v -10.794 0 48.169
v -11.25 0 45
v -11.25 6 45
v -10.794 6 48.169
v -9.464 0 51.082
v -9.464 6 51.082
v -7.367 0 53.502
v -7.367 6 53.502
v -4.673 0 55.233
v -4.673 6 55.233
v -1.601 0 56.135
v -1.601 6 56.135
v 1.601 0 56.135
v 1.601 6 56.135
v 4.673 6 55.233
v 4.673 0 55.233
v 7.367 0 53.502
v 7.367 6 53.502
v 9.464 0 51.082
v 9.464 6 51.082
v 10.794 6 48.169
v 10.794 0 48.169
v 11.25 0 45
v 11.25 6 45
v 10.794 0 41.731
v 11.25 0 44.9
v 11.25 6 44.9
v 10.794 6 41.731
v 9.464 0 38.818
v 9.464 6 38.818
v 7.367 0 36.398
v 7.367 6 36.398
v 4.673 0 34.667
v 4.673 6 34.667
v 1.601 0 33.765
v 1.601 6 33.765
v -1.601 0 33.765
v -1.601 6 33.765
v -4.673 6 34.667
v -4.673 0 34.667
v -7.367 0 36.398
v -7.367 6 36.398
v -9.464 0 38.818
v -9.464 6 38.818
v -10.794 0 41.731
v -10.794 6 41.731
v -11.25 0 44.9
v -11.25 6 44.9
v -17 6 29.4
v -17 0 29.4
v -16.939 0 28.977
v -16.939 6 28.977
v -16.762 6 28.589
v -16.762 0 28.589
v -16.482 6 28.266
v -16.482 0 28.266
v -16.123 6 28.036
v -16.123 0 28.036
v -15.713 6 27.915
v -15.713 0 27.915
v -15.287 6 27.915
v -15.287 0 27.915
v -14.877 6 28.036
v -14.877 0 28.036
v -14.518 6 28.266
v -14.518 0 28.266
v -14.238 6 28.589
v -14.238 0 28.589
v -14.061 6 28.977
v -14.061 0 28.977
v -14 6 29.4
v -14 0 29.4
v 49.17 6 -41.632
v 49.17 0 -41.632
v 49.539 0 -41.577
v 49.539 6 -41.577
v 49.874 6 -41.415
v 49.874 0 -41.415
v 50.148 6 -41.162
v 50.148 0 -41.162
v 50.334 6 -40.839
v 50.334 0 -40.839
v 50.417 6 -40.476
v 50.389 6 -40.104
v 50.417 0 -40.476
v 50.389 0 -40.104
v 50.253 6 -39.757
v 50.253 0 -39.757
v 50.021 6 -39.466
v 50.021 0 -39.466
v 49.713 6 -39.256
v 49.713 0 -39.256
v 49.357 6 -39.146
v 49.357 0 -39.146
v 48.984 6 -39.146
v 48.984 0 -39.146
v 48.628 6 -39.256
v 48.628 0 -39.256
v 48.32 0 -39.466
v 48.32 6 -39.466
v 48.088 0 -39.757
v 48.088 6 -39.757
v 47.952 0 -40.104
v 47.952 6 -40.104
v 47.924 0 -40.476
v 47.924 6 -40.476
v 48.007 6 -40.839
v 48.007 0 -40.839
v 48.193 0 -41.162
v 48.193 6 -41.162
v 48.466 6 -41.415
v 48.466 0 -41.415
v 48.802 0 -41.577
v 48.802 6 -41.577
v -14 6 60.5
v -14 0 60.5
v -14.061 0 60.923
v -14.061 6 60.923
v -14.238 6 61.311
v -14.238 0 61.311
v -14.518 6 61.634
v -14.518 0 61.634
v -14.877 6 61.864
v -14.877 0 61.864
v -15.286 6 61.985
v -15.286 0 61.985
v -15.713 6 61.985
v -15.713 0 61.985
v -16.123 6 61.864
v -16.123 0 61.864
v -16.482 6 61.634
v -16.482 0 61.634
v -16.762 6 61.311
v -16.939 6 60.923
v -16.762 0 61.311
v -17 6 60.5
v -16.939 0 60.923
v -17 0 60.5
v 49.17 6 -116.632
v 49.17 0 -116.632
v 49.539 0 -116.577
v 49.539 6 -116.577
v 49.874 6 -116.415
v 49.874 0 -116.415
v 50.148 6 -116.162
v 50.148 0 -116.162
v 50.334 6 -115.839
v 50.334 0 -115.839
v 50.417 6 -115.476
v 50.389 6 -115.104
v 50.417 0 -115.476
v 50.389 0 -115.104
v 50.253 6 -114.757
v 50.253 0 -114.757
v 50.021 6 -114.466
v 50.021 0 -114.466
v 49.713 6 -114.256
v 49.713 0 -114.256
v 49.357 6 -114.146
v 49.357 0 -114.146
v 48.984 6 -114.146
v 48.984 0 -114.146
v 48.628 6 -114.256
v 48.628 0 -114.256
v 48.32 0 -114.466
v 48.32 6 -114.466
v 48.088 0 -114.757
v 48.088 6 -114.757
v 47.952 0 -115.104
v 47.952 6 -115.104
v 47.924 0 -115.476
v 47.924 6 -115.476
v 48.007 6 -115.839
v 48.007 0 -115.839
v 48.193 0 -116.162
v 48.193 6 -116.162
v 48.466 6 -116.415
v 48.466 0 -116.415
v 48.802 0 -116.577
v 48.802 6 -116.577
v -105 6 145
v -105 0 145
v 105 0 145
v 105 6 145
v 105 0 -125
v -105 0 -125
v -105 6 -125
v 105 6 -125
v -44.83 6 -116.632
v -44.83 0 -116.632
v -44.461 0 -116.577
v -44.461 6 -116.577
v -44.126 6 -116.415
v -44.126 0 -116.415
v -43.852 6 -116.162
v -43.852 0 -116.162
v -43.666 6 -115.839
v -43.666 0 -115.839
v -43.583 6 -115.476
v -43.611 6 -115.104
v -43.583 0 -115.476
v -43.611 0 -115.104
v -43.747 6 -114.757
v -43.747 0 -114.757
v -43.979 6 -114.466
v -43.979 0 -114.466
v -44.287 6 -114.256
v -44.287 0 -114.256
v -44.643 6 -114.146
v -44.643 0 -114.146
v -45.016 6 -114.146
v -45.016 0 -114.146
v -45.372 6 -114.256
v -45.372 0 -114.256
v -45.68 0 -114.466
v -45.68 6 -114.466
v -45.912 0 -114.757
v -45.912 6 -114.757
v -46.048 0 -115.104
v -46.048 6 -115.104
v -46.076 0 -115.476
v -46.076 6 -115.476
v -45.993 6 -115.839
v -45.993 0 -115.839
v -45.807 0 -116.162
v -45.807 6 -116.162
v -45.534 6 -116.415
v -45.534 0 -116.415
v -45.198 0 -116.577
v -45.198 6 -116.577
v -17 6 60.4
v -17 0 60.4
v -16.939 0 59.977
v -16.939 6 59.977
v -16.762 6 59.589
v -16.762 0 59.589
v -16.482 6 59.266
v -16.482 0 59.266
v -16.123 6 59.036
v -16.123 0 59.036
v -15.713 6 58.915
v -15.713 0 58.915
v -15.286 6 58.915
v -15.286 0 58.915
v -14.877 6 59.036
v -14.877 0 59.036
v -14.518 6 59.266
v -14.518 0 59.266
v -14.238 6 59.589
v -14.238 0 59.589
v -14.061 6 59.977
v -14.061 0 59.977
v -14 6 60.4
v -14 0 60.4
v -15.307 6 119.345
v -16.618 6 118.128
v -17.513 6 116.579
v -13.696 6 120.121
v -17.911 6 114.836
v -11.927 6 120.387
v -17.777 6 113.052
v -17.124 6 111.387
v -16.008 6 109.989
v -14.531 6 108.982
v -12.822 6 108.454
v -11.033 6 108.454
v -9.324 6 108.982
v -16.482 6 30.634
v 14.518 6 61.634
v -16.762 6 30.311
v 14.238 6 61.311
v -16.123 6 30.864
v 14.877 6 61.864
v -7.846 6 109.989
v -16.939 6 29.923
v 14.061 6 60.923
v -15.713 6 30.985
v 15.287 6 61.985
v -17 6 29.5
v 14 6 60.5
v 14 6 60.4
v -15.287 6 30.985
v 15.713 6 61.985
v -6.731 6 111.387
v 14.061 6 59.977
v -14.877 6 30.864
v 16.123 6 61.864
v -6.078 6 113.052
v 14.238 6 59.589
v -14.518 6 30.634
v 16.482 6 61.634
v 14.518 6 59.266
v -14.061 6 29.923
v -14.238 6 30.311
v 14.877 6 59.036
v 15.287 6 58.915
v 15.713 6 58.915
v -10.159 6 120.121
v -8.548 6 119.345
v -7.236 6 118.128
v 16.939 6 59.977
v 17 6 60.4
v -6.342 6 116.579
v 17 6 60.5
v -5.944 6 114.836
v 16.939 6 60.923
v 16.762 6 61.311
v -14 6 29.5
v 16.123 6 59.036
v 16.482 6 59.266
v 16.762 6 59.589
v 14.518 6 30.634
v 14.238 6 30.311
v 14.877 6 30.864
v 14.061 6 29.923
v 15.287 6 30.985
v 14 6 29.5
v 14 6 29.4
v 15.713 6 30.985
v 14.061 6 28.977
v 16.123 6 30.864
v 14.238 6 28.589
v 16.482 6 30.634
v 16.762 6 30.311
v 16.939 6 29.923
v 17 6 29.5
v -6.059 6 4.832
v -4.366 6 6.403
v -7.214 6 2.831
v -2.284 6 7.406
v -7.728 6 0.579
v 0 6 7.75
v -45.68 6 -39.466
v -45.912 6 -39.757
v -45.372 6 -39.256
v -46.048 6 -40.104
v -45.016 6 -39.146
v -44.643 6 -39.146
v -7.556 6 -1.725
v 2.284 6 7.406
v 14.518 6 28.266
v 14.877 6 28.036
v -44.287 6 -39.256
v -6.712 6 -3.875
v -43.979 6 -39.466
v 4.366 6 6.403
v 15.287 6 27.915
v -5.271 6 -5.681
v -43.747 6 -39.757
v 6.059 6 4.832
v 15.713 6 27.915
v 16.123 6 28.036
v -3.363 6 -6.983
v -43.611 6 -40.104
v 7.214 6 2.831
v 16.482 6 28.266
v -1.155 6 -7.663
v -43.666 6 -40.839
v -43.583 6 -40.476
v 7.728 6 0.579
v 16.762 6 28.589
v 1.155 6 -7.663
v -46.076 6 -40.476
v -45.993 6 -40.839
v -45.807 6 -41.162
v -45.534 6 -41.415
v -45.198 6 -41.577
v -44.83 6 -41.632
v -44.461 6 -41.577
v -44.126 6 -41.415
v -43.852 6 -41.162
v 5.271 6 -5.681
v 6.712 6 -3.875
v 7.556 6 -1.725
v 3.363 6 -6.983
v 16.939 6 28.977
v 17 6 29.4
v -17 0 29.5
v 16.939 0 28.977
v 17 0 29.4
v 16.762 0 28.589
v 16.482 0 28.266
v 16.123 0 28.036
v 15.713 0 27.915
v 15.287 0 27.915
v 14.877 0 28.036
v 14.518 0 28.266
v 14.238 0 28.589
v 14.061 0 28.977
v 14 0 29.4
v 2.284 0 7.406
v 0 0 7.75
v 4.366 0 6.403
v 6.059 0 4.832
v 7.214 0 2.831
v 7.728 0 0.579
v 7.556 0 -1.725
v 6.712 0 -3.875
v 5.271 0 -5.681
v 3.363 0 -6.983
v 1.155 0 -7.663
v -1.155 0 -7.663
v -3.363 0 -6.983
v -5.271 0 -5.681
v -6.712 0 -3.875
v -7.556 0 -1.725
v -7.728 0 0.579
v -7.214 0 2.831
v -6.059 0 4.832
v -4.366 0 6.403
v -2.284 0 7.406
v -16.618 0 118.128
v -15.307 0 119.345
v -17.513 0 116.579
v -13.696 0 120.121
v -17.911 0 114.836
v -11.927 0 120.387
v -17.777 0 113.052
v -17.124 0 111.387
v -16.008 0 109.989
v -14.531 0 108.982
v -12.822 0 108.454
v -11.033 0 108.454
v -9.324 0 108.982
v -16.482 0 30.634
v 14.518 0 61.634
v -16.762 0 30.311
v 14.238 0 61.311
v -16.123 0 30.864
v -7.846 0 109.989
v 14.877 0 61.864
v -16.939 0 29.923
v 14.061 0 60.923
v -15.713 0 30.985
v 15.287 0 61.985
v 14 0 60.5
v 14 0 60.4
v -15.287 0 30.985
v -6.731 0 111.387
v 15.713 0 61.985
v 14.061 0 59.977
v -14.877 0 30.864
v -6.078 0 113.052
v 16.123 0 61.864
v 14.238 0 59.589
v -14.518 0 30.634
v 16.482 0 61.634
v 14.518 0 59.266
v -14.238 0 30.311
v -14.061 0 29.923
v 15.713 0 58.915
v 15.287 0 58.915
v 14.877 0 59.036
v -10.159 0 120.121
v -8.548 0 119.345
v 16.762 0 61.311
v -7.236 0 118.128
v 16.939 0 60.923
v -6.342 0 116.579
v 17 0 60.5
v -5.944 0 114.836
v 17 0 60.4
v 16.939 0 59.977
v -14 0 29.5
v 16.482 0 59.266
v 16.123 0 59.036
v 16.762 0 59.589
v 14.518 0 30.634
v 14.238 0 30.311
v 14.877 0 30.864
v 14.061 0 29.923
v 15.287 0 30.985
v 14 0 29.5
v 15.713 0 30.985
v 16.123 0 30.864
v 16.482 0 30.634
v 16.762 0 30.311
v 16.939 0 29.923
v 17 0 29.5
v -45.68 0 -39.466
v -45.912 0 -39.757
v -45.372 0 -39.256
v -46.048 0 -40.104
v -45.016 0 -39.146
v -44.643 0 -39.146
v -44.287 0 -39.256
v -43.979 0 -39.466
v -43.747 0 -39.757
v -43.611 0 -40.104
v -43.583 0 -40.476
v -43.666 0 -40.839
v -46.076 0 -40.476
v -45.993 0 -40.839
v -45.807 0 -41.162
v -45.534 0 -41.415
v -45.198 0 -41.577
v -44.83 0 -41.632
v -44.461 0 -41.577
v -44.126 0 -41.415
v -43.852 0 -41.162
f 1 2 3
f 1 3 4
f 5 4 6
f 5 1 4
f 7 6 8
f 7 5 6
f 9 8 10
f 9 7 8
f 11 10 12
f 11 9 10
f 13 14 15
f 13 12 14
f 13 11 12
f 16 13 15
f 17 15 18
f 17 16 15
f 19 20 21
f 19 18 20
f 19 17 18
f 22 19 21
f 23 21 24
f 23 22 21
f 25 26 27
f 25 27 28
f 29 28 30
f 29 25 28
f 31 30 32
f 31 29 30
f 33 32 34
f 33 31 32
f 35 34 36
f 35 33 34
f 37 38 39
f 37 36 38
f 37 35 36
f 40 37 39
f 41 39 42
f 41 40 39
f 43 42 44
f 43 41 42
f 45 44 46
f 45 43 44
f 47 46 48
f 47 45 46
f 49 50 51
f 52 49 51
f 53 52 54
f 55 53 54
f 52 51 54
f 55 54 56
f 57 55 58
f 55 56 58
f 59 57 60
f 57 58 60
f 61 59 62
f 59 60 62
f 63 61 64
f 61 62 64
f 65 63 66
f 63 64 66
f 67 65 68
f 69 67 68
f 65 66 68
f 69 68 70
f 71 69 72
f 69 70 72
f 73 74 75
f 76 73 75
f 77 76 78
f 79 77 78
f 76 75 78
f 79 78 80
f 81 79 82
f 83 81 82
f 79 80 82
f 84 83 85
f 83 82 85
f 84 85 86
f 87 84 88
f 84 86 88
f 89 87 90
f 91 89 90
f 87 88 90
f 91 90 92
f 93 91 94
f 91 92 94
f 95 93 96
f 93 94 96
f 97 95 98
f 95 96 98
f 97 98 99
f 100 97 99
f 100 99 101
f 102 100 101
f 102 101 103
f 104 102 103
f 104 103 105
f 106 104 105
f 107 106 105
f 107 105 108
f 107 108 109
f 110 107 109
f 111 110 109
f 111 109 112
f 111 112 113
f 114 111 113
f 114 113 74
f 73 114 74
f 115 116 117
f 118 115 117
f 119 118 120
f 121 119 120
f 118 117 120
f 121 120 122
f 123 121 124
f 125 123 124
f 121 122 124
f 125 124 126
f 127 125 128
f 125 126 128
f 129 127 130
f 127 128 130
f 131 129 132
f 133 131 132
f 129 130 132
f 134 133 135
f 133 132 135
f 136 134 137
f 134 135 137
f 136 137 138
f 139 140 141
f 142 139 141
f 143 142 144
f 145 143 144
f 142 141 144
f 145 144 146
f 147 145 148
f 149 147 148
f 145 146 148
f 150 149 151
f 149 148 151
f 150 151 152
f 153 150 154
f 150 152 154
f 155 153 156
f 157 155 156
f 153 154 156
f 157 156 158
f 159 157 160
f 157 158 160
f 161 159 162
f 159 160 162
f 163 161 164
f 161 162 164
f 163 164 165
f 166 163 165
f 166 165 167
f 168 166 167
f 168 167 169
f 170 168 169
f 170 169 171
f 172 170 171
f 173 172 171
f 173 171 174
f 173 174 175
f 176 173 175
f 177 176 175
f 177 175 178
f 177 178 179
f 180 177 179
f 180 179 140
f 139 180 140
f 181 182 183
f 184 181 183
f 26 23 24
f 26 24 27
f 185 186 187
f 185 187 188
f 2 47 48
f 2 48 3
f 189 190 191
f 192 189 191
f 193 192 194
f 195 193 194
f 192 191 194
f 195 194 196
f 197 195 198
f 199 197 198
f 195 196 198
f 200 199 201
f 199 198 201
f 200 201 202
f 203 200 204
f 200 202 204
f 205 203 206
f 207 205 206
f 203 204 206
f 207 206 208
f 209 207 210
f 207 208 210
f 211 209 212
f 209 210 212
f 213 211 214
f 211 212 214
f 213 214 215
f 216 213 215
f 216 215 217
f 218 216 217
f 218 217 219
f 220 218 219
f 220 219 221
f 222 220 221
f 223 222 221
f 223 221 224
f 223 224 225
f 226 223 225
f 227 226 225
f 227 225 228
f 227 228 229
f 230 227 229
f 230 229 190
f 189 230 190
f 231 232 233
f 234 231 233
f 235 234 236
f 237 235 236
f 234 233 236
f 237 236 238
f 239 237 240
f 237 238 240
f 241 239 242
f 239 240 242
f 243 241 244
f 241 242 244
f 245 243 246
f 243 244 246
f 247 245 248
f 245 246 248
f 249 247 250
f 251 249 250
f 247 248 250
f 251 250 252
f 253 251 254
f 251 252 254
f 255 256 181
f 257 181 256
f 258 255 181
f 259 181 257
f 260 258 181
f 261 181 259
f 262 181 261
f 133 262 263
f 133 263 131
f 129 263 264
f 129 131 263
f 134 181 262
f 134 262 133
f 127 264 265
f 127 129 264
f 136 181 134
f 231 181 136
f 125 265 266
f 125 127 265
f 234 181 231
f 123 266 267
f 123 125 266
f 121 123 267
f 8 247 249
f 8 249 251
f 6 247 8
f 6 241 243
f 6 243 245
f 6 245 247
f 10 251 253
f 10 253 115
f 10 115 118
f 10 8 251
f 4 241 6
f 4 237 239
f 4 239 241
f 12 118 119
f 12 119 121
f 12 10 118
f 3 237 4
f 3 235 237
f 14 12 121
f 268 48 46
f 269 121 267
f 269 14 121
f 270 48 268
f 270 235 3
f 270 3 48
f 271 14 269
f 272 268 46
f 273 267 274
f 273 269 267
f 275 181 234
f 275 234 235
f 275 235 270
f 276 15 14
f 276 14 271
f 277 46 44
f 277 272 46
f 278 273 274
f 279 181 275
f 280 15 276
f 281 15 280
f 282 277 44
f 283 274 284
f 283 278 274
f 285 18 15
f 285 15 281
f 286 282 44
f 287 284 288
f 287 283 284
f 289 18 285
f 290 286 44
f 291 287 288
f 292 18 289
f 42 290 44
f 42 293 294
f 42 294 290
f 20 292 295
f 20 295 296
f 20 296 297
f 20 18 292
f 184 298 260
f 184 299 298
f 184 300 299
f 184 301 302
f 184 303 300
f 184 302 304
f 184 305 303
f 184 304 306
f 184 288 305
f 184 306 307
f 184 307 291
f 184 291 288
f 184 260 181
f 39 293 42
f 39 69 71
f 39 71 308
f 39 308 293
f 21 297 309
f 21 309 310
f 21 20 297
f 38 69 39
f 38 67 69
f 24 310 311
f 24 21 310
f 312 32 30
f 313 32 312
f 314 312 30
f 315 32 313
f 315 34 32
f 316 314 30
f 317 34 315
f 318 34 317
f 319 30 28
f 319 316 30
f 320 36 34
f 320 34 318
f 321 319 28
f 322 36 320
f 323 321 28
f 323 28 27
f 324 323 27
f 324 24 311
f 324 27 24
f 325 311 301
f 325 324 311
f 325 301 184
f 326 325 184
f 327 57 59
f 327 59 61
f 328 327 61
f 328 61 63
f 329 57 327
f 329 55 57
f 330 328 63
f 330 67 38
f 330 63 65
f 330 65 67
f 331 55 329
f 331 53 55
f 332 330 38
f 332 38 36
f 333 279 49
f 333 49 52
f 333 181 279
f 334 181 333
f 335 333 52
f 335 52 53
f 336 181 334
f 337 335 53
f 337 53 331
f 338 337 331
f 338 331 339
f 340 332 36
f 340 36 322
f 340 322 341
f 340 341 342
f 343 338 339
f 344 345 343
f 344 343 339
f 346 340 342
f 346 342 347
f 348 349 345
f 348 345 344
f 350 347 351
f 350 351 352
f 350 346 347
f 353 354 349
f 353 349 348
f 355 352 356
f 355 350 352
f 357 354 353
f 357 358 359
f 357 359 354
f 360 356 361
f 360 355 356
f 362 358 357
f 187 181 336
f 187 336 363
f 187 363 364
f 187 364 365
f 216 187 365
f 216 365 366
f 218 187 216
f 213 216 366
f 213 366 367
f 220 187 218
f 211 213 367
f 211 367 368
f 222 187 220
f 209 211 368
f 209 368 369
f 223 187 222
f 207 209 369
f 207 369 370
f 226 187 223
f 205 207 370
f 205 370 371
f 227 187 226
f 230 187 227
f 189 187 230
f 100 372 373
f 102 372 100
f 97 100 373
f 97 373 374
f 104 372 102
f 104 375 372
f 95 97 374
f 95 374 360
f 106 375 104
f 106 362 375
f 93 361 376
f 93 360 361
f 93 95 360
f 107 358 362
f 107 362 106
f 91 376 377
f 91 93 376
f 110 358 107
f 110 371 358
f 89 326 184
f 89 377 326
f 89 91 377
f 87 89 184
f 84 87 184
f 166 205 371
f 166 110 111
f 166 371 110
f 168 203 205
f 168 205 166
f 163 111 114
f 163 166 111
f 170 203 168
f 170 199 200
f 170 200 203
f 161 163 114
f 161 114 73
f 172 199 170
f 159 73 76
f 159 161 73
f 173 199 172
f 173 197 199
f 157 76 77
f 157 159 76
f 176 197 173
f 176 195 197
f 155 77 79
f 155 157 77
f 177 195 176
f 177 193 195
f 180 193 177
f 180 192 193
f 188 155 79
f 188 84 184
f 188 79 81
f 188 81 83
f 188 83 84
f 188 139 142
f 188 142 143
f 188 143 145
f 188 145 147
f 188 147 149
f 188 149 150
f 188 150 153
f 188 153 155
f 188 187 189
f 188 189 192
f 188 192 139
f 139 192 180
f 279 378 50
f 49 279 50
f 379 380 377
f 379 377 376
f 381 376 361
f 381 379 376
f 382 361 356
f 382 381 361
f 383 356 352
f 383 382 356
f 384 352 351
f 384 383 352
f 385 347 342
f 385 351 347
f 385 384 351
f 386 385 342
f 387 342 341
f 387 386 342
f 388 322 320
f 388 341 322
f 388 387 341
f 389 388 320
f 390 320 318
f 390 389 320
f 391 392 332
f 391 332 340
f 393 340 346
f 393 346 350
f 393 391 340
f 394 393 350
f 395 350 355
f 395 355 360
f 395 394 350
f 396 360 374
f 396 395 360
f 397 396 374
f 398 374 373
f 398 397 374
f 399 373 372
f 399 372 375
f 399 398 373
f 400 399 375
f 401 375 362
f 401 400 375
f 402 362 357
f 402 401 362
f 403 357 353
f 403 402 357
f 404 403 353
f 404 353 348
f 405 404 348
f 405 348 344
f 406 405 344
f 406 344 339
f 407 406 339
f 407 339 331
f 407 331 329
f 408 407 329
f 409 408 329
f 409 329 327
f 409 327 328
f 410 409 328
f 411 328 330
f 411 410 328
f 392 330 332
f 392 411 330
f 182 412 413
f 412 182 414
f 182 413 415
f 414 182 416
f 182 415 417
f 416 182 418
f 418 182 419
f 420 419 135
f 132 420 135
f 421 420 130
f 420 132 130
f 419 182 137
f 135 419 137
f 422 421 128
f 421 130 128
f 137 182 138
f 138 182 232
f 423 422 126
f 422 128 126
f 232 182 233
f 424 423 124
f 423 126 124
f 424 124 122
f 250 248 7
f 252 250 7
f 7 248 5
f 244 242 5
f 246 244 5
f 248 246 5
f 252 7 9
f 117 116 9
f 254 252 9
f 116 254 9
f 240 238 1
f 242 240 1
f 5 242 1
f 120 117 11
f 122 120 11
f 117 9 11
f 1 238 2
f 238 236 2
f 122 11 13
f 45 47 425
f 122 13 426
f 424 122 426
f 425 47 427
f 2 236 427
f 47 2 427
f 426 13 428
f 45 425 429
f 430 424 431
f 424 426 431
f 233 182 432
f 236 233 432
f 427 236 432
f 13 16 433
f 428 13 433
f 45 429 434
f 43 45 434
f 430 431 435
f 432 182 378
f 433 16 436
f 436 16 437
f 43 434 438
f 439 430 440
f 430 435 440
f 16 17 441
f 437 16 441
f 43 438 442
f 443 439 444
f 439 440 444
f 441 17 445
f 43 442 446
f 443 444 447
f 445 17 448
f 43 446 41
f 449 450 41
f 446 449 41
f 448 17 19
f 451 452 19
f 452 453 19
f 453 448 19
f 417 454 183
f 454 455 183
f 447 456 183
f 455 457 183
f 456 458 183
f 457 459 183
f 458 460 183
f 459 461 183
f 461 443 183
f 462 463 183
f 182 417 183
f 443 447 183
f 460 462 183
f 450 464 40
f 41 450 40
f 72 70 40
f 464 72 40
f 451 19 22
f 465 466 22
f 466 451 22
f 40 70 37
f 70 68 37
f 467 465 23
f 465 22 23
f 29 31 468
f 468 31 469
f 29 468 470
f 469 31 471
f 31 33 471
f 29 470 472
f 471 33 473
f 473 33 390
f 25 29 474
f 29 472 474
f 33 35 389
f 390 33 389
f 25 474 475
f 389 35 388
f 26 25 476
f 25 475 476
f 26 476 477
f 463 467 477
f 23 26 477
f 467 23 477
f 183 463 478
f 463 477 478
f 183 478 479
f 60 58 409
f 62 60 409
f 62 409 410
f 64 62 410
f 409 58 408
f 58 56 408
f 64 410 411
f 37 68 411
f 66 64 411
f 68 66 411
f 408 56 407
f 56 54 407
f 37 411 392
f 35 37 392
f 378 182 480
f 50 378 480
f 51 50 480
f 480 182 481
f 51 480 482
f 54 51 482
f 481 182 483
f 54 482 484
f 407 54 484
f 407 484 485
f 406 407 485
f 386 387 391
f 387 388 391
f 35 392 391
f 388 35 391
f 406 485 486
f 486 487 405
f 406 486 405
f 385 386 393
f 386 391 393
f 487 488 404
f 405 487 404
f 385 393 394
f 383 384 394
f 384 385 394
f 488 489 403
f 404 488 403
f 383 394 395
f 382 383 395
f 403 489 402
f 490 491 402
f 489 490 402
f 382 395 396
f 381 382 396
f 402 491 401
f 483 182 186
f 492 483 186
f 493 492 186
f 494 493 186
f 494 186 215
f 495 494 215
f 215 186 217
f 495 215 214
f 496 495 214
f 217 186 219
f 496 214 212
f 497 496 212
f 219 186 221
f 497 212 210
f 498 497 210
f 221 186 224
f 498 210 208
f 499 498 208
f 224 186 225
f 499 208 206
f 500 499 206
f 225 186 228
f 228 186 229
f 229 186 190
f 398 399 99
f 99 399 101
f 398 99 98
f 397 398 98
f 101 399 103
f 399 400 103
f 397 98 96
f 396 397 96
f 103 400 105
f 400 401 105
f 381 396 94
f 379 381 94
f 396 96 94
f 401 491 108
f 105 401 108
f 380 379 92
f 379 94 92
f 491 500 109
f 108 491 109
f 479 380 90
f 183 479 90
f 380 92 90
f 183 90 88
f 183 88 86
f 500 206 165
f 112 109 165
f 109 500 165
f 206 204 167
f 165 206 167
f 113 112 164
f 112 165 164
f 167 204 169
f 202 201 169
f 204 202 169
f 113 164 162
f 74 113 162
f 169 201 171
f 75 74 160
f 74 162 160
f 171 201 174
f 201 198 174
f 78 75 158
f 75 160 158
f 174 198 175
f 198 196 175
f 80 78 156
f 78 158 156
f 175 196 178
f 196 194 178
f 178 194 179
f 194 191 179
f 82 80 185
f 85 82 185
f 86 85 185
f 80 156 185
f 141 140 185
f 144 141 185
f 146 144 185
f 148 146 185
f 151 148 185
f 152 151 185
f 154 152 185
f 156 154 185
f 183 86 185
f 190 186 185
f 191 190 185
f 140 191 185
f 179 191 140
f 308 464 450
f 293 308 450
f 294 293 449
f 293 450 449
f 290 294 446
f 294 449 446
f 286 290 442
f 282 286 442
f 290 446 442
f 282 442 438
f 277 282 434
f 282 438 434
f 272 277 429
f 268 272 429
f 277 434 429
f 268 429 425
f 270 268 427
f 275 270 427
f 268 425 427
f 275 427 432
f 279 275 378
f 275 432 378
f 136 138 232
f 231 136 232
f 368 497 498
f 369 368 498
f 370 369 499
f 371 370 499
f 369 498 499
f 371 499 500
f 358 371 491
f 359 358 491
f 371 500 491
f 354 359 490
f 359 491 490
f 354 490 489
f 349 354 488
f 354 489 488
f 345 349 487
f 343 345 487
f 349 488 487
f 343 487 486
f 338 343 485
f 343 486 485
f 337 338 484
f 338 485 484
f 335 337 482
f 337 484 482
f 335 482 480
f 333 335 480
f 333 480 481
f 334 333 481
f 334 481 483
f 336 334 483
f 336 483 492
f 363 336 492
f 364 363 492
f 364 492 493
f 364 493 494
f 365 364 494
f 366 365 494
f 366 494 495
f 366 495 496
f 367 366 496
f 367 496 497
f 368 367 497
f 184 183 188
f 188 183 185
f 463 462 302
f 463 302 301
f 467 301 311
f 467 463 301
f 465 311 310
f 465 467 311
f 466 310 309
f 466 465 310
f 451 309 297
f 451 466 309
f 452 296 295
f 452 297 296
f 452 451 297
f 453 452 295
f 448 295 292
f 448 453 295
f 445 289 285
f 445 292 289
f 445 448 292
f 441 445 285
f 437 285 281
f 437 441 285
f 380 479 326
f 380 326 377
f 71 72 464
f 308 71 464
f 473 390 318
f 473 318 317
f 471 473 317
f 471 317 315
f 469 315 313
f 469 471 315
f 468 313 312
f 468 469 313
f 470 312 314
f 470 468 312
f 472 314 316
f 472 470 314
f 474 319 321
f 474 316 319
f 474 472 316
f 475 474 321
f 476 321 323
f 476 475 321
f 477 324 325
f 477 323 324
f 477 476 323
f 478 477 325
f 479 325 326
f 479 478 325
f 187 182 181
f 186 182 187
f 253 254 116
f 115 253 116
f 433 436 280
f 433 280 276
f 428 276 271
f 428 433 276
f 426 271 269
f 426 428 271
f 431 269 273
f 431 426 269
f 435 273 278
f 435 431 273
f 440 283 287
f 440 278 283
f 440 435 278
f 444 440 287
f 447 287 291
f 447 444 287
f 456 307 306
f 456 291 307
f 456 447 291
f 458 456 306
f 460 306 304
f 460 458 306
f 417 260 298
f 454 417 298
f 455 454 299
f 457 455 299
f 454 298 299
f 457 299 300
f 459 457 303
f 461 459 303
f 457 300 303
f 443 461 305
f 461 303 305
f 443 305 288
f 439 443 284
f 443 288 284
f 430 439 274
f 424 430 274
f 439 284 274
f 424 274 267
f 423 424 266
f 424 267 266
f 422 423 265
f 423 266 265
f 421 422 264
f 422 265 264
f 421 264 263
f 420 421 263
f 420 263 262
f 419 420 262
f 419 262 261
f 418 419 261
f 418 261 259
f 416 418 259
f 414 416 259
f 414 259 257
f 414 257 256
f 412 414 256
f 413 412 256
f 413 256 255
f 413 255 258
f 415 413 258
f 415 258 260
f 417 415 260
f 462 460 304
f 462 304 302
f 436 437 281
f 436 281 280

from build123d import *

# Parameters (mm, degrees)
SKETCH1_W           = 210
SKETCH1_H           = 270
SKETCH1_R           = 7.75
BOSS_EXTRUDE2_DEPTH = 6
CUT_EXTRUDE1_DEPTH  = 10
SKETCH4_R           = 1.25
CUT_EXTRUDE2_DEPTH  = 10
SKETCH5_R           = 6
CUT_EXTRUDE3_DEPTH  = 10


with BuildPart() as part:
    # Sketch1 → Boss-Extrude2 (new body)
    with BuildSketch(Plane(origin=(0, 0, 0), x_dir=(1, 0, 0), z_dir=(0, 1, 0))):
        with Locations((0, -10)):
            Rectangle(SKETCH1_W, SKETCH1_H)
        with Locations(Location((0, 0, 0), (0, 0, 270))):
            Circle(SKETCH1_R, mode=Mode.SUBTRACT)
    extrude(amount=BOSS_EXTRUDE2_DEPTH)

    # Sketch3 → Cut-Extrude1 (cut)
    with BuildSketch(Plane.XZ):
        with BuildLine():
            Line((17.000022153, 29.5), (17.000022153, 29.4))
            ThreePointArc((17.000022153, 29.4), (15.500022153, 27.9), (14.000022153, 29.4))
            Line((14.000022153, 29.4), (14.000022153, 29.5))
            ThreePointArc((14.000022153, 29.5), (15.500022153, 31), (17.000022153, 29.5))
        make_face()
        with BuildLine():
            Line((17.000022153, 60.5), (17.000022153, 60.4))
            ThreePointArc((17.000022153, 60.4), (15.500022153, 58.9), (14.000022153, 60.4))
            Line((14.000022153, 60.4), (14.000022153, 60.5))
            ThreePointArc((14.000022153, 60.5), (15.500022153, 62), (17.000022153, 60.5))
        make_face()
        with BuildLine():
            Line((-16.999993108, 29.500016738), (-16.999993206, 29.400016738))
            ThreePointArc((-16.999993206, 29.400016738), (-15.499994683, 27.900015261), (-13.999993206, 29.400013784))
            Line((-13.999993206, 29.400013784), (-13.999993108, 29.500013784))
            ThreePointArc((-13.999993108, 29.500013784), (-15.499991631, 31.000015261), (-16.999993108, 29.500016738))
        make_face()
        with BuildLine():
            Line((-16.999962586, 60.500016738), (-16.999962684, 60.400016738))
            ThreePointArc((-16.999962684, 60.400016738), (-15.499964161, 58.900015261), (-13.999962684, 60.400013784))
            Line((-13.999962684, 60.400013784), (-13.999962586, 60.500013784))
            ThreePointArc((-13.999962586, 60.500013784), (-15.499961109, 62.000015261), (-16.999962586, 60.500016738))
        make_face()
        with BuildLine():
            Line((11.250022153, 44.999994462), (11.250022104, 44.899994462))
            ThreePointArc((11.250022104, 44.899994462), (1.6566e-05, 33.65), (-11.249977896, 44.900005538))
            Line((-11.249977896, 44.900005538), (-11.249977847, 45.000005538))
            ThreePointArc((-11.249977847, 45.000005538), (2.7692e-05, 56.25), (11.250022153, 44.999994462))
        make_face()
    extrude(amount=-CUT_EXTRUDE1_DEPTH, mode=Mode.SUBTRACT)

    # Sketch4 → Cut-Extrude2 (cut)
    with BuildSketch(Plane.XZ):
        with Locations(Location((49.170333674, -115.382230576, 0), (0, 0, 270))):
            Circle(SKETCH4_R)
        with Locations(Location((-44.829666326, -115.382230576, 0), (0, 0, 270))):
            Circle(SKETCH4_R)
        with Locations(Location((49.170333674, -40.382230576, 0), (0, 0, 270))):
            Circle(SKETCH4_R)
        with Locations(Location((-44.829666326, -40.382230576, 0), (0, 0, 270))):
            Circle(SKETCH4_R)
    extrude(amount=-CUT_EXTRUDE2_DEPTH, mode=Mode.SUBTRACT)

    # Sketch5 → Cut-Extrude3 (cut)
    with BuildSketch(Plane(origin=(0, 6, 0), x_dir=(1, 0, 0), z_dir=(0, 1, 0))):
        with Locations(Location((-11.927460167, -114.387337557, 0), (0, 0, 270))):
            Circle(SKETCH5_R)
    extrude(amount=-CUT_EXTRUDE3_DEPTH, mode=Mode.SUBTRACT)


solid = part.part
